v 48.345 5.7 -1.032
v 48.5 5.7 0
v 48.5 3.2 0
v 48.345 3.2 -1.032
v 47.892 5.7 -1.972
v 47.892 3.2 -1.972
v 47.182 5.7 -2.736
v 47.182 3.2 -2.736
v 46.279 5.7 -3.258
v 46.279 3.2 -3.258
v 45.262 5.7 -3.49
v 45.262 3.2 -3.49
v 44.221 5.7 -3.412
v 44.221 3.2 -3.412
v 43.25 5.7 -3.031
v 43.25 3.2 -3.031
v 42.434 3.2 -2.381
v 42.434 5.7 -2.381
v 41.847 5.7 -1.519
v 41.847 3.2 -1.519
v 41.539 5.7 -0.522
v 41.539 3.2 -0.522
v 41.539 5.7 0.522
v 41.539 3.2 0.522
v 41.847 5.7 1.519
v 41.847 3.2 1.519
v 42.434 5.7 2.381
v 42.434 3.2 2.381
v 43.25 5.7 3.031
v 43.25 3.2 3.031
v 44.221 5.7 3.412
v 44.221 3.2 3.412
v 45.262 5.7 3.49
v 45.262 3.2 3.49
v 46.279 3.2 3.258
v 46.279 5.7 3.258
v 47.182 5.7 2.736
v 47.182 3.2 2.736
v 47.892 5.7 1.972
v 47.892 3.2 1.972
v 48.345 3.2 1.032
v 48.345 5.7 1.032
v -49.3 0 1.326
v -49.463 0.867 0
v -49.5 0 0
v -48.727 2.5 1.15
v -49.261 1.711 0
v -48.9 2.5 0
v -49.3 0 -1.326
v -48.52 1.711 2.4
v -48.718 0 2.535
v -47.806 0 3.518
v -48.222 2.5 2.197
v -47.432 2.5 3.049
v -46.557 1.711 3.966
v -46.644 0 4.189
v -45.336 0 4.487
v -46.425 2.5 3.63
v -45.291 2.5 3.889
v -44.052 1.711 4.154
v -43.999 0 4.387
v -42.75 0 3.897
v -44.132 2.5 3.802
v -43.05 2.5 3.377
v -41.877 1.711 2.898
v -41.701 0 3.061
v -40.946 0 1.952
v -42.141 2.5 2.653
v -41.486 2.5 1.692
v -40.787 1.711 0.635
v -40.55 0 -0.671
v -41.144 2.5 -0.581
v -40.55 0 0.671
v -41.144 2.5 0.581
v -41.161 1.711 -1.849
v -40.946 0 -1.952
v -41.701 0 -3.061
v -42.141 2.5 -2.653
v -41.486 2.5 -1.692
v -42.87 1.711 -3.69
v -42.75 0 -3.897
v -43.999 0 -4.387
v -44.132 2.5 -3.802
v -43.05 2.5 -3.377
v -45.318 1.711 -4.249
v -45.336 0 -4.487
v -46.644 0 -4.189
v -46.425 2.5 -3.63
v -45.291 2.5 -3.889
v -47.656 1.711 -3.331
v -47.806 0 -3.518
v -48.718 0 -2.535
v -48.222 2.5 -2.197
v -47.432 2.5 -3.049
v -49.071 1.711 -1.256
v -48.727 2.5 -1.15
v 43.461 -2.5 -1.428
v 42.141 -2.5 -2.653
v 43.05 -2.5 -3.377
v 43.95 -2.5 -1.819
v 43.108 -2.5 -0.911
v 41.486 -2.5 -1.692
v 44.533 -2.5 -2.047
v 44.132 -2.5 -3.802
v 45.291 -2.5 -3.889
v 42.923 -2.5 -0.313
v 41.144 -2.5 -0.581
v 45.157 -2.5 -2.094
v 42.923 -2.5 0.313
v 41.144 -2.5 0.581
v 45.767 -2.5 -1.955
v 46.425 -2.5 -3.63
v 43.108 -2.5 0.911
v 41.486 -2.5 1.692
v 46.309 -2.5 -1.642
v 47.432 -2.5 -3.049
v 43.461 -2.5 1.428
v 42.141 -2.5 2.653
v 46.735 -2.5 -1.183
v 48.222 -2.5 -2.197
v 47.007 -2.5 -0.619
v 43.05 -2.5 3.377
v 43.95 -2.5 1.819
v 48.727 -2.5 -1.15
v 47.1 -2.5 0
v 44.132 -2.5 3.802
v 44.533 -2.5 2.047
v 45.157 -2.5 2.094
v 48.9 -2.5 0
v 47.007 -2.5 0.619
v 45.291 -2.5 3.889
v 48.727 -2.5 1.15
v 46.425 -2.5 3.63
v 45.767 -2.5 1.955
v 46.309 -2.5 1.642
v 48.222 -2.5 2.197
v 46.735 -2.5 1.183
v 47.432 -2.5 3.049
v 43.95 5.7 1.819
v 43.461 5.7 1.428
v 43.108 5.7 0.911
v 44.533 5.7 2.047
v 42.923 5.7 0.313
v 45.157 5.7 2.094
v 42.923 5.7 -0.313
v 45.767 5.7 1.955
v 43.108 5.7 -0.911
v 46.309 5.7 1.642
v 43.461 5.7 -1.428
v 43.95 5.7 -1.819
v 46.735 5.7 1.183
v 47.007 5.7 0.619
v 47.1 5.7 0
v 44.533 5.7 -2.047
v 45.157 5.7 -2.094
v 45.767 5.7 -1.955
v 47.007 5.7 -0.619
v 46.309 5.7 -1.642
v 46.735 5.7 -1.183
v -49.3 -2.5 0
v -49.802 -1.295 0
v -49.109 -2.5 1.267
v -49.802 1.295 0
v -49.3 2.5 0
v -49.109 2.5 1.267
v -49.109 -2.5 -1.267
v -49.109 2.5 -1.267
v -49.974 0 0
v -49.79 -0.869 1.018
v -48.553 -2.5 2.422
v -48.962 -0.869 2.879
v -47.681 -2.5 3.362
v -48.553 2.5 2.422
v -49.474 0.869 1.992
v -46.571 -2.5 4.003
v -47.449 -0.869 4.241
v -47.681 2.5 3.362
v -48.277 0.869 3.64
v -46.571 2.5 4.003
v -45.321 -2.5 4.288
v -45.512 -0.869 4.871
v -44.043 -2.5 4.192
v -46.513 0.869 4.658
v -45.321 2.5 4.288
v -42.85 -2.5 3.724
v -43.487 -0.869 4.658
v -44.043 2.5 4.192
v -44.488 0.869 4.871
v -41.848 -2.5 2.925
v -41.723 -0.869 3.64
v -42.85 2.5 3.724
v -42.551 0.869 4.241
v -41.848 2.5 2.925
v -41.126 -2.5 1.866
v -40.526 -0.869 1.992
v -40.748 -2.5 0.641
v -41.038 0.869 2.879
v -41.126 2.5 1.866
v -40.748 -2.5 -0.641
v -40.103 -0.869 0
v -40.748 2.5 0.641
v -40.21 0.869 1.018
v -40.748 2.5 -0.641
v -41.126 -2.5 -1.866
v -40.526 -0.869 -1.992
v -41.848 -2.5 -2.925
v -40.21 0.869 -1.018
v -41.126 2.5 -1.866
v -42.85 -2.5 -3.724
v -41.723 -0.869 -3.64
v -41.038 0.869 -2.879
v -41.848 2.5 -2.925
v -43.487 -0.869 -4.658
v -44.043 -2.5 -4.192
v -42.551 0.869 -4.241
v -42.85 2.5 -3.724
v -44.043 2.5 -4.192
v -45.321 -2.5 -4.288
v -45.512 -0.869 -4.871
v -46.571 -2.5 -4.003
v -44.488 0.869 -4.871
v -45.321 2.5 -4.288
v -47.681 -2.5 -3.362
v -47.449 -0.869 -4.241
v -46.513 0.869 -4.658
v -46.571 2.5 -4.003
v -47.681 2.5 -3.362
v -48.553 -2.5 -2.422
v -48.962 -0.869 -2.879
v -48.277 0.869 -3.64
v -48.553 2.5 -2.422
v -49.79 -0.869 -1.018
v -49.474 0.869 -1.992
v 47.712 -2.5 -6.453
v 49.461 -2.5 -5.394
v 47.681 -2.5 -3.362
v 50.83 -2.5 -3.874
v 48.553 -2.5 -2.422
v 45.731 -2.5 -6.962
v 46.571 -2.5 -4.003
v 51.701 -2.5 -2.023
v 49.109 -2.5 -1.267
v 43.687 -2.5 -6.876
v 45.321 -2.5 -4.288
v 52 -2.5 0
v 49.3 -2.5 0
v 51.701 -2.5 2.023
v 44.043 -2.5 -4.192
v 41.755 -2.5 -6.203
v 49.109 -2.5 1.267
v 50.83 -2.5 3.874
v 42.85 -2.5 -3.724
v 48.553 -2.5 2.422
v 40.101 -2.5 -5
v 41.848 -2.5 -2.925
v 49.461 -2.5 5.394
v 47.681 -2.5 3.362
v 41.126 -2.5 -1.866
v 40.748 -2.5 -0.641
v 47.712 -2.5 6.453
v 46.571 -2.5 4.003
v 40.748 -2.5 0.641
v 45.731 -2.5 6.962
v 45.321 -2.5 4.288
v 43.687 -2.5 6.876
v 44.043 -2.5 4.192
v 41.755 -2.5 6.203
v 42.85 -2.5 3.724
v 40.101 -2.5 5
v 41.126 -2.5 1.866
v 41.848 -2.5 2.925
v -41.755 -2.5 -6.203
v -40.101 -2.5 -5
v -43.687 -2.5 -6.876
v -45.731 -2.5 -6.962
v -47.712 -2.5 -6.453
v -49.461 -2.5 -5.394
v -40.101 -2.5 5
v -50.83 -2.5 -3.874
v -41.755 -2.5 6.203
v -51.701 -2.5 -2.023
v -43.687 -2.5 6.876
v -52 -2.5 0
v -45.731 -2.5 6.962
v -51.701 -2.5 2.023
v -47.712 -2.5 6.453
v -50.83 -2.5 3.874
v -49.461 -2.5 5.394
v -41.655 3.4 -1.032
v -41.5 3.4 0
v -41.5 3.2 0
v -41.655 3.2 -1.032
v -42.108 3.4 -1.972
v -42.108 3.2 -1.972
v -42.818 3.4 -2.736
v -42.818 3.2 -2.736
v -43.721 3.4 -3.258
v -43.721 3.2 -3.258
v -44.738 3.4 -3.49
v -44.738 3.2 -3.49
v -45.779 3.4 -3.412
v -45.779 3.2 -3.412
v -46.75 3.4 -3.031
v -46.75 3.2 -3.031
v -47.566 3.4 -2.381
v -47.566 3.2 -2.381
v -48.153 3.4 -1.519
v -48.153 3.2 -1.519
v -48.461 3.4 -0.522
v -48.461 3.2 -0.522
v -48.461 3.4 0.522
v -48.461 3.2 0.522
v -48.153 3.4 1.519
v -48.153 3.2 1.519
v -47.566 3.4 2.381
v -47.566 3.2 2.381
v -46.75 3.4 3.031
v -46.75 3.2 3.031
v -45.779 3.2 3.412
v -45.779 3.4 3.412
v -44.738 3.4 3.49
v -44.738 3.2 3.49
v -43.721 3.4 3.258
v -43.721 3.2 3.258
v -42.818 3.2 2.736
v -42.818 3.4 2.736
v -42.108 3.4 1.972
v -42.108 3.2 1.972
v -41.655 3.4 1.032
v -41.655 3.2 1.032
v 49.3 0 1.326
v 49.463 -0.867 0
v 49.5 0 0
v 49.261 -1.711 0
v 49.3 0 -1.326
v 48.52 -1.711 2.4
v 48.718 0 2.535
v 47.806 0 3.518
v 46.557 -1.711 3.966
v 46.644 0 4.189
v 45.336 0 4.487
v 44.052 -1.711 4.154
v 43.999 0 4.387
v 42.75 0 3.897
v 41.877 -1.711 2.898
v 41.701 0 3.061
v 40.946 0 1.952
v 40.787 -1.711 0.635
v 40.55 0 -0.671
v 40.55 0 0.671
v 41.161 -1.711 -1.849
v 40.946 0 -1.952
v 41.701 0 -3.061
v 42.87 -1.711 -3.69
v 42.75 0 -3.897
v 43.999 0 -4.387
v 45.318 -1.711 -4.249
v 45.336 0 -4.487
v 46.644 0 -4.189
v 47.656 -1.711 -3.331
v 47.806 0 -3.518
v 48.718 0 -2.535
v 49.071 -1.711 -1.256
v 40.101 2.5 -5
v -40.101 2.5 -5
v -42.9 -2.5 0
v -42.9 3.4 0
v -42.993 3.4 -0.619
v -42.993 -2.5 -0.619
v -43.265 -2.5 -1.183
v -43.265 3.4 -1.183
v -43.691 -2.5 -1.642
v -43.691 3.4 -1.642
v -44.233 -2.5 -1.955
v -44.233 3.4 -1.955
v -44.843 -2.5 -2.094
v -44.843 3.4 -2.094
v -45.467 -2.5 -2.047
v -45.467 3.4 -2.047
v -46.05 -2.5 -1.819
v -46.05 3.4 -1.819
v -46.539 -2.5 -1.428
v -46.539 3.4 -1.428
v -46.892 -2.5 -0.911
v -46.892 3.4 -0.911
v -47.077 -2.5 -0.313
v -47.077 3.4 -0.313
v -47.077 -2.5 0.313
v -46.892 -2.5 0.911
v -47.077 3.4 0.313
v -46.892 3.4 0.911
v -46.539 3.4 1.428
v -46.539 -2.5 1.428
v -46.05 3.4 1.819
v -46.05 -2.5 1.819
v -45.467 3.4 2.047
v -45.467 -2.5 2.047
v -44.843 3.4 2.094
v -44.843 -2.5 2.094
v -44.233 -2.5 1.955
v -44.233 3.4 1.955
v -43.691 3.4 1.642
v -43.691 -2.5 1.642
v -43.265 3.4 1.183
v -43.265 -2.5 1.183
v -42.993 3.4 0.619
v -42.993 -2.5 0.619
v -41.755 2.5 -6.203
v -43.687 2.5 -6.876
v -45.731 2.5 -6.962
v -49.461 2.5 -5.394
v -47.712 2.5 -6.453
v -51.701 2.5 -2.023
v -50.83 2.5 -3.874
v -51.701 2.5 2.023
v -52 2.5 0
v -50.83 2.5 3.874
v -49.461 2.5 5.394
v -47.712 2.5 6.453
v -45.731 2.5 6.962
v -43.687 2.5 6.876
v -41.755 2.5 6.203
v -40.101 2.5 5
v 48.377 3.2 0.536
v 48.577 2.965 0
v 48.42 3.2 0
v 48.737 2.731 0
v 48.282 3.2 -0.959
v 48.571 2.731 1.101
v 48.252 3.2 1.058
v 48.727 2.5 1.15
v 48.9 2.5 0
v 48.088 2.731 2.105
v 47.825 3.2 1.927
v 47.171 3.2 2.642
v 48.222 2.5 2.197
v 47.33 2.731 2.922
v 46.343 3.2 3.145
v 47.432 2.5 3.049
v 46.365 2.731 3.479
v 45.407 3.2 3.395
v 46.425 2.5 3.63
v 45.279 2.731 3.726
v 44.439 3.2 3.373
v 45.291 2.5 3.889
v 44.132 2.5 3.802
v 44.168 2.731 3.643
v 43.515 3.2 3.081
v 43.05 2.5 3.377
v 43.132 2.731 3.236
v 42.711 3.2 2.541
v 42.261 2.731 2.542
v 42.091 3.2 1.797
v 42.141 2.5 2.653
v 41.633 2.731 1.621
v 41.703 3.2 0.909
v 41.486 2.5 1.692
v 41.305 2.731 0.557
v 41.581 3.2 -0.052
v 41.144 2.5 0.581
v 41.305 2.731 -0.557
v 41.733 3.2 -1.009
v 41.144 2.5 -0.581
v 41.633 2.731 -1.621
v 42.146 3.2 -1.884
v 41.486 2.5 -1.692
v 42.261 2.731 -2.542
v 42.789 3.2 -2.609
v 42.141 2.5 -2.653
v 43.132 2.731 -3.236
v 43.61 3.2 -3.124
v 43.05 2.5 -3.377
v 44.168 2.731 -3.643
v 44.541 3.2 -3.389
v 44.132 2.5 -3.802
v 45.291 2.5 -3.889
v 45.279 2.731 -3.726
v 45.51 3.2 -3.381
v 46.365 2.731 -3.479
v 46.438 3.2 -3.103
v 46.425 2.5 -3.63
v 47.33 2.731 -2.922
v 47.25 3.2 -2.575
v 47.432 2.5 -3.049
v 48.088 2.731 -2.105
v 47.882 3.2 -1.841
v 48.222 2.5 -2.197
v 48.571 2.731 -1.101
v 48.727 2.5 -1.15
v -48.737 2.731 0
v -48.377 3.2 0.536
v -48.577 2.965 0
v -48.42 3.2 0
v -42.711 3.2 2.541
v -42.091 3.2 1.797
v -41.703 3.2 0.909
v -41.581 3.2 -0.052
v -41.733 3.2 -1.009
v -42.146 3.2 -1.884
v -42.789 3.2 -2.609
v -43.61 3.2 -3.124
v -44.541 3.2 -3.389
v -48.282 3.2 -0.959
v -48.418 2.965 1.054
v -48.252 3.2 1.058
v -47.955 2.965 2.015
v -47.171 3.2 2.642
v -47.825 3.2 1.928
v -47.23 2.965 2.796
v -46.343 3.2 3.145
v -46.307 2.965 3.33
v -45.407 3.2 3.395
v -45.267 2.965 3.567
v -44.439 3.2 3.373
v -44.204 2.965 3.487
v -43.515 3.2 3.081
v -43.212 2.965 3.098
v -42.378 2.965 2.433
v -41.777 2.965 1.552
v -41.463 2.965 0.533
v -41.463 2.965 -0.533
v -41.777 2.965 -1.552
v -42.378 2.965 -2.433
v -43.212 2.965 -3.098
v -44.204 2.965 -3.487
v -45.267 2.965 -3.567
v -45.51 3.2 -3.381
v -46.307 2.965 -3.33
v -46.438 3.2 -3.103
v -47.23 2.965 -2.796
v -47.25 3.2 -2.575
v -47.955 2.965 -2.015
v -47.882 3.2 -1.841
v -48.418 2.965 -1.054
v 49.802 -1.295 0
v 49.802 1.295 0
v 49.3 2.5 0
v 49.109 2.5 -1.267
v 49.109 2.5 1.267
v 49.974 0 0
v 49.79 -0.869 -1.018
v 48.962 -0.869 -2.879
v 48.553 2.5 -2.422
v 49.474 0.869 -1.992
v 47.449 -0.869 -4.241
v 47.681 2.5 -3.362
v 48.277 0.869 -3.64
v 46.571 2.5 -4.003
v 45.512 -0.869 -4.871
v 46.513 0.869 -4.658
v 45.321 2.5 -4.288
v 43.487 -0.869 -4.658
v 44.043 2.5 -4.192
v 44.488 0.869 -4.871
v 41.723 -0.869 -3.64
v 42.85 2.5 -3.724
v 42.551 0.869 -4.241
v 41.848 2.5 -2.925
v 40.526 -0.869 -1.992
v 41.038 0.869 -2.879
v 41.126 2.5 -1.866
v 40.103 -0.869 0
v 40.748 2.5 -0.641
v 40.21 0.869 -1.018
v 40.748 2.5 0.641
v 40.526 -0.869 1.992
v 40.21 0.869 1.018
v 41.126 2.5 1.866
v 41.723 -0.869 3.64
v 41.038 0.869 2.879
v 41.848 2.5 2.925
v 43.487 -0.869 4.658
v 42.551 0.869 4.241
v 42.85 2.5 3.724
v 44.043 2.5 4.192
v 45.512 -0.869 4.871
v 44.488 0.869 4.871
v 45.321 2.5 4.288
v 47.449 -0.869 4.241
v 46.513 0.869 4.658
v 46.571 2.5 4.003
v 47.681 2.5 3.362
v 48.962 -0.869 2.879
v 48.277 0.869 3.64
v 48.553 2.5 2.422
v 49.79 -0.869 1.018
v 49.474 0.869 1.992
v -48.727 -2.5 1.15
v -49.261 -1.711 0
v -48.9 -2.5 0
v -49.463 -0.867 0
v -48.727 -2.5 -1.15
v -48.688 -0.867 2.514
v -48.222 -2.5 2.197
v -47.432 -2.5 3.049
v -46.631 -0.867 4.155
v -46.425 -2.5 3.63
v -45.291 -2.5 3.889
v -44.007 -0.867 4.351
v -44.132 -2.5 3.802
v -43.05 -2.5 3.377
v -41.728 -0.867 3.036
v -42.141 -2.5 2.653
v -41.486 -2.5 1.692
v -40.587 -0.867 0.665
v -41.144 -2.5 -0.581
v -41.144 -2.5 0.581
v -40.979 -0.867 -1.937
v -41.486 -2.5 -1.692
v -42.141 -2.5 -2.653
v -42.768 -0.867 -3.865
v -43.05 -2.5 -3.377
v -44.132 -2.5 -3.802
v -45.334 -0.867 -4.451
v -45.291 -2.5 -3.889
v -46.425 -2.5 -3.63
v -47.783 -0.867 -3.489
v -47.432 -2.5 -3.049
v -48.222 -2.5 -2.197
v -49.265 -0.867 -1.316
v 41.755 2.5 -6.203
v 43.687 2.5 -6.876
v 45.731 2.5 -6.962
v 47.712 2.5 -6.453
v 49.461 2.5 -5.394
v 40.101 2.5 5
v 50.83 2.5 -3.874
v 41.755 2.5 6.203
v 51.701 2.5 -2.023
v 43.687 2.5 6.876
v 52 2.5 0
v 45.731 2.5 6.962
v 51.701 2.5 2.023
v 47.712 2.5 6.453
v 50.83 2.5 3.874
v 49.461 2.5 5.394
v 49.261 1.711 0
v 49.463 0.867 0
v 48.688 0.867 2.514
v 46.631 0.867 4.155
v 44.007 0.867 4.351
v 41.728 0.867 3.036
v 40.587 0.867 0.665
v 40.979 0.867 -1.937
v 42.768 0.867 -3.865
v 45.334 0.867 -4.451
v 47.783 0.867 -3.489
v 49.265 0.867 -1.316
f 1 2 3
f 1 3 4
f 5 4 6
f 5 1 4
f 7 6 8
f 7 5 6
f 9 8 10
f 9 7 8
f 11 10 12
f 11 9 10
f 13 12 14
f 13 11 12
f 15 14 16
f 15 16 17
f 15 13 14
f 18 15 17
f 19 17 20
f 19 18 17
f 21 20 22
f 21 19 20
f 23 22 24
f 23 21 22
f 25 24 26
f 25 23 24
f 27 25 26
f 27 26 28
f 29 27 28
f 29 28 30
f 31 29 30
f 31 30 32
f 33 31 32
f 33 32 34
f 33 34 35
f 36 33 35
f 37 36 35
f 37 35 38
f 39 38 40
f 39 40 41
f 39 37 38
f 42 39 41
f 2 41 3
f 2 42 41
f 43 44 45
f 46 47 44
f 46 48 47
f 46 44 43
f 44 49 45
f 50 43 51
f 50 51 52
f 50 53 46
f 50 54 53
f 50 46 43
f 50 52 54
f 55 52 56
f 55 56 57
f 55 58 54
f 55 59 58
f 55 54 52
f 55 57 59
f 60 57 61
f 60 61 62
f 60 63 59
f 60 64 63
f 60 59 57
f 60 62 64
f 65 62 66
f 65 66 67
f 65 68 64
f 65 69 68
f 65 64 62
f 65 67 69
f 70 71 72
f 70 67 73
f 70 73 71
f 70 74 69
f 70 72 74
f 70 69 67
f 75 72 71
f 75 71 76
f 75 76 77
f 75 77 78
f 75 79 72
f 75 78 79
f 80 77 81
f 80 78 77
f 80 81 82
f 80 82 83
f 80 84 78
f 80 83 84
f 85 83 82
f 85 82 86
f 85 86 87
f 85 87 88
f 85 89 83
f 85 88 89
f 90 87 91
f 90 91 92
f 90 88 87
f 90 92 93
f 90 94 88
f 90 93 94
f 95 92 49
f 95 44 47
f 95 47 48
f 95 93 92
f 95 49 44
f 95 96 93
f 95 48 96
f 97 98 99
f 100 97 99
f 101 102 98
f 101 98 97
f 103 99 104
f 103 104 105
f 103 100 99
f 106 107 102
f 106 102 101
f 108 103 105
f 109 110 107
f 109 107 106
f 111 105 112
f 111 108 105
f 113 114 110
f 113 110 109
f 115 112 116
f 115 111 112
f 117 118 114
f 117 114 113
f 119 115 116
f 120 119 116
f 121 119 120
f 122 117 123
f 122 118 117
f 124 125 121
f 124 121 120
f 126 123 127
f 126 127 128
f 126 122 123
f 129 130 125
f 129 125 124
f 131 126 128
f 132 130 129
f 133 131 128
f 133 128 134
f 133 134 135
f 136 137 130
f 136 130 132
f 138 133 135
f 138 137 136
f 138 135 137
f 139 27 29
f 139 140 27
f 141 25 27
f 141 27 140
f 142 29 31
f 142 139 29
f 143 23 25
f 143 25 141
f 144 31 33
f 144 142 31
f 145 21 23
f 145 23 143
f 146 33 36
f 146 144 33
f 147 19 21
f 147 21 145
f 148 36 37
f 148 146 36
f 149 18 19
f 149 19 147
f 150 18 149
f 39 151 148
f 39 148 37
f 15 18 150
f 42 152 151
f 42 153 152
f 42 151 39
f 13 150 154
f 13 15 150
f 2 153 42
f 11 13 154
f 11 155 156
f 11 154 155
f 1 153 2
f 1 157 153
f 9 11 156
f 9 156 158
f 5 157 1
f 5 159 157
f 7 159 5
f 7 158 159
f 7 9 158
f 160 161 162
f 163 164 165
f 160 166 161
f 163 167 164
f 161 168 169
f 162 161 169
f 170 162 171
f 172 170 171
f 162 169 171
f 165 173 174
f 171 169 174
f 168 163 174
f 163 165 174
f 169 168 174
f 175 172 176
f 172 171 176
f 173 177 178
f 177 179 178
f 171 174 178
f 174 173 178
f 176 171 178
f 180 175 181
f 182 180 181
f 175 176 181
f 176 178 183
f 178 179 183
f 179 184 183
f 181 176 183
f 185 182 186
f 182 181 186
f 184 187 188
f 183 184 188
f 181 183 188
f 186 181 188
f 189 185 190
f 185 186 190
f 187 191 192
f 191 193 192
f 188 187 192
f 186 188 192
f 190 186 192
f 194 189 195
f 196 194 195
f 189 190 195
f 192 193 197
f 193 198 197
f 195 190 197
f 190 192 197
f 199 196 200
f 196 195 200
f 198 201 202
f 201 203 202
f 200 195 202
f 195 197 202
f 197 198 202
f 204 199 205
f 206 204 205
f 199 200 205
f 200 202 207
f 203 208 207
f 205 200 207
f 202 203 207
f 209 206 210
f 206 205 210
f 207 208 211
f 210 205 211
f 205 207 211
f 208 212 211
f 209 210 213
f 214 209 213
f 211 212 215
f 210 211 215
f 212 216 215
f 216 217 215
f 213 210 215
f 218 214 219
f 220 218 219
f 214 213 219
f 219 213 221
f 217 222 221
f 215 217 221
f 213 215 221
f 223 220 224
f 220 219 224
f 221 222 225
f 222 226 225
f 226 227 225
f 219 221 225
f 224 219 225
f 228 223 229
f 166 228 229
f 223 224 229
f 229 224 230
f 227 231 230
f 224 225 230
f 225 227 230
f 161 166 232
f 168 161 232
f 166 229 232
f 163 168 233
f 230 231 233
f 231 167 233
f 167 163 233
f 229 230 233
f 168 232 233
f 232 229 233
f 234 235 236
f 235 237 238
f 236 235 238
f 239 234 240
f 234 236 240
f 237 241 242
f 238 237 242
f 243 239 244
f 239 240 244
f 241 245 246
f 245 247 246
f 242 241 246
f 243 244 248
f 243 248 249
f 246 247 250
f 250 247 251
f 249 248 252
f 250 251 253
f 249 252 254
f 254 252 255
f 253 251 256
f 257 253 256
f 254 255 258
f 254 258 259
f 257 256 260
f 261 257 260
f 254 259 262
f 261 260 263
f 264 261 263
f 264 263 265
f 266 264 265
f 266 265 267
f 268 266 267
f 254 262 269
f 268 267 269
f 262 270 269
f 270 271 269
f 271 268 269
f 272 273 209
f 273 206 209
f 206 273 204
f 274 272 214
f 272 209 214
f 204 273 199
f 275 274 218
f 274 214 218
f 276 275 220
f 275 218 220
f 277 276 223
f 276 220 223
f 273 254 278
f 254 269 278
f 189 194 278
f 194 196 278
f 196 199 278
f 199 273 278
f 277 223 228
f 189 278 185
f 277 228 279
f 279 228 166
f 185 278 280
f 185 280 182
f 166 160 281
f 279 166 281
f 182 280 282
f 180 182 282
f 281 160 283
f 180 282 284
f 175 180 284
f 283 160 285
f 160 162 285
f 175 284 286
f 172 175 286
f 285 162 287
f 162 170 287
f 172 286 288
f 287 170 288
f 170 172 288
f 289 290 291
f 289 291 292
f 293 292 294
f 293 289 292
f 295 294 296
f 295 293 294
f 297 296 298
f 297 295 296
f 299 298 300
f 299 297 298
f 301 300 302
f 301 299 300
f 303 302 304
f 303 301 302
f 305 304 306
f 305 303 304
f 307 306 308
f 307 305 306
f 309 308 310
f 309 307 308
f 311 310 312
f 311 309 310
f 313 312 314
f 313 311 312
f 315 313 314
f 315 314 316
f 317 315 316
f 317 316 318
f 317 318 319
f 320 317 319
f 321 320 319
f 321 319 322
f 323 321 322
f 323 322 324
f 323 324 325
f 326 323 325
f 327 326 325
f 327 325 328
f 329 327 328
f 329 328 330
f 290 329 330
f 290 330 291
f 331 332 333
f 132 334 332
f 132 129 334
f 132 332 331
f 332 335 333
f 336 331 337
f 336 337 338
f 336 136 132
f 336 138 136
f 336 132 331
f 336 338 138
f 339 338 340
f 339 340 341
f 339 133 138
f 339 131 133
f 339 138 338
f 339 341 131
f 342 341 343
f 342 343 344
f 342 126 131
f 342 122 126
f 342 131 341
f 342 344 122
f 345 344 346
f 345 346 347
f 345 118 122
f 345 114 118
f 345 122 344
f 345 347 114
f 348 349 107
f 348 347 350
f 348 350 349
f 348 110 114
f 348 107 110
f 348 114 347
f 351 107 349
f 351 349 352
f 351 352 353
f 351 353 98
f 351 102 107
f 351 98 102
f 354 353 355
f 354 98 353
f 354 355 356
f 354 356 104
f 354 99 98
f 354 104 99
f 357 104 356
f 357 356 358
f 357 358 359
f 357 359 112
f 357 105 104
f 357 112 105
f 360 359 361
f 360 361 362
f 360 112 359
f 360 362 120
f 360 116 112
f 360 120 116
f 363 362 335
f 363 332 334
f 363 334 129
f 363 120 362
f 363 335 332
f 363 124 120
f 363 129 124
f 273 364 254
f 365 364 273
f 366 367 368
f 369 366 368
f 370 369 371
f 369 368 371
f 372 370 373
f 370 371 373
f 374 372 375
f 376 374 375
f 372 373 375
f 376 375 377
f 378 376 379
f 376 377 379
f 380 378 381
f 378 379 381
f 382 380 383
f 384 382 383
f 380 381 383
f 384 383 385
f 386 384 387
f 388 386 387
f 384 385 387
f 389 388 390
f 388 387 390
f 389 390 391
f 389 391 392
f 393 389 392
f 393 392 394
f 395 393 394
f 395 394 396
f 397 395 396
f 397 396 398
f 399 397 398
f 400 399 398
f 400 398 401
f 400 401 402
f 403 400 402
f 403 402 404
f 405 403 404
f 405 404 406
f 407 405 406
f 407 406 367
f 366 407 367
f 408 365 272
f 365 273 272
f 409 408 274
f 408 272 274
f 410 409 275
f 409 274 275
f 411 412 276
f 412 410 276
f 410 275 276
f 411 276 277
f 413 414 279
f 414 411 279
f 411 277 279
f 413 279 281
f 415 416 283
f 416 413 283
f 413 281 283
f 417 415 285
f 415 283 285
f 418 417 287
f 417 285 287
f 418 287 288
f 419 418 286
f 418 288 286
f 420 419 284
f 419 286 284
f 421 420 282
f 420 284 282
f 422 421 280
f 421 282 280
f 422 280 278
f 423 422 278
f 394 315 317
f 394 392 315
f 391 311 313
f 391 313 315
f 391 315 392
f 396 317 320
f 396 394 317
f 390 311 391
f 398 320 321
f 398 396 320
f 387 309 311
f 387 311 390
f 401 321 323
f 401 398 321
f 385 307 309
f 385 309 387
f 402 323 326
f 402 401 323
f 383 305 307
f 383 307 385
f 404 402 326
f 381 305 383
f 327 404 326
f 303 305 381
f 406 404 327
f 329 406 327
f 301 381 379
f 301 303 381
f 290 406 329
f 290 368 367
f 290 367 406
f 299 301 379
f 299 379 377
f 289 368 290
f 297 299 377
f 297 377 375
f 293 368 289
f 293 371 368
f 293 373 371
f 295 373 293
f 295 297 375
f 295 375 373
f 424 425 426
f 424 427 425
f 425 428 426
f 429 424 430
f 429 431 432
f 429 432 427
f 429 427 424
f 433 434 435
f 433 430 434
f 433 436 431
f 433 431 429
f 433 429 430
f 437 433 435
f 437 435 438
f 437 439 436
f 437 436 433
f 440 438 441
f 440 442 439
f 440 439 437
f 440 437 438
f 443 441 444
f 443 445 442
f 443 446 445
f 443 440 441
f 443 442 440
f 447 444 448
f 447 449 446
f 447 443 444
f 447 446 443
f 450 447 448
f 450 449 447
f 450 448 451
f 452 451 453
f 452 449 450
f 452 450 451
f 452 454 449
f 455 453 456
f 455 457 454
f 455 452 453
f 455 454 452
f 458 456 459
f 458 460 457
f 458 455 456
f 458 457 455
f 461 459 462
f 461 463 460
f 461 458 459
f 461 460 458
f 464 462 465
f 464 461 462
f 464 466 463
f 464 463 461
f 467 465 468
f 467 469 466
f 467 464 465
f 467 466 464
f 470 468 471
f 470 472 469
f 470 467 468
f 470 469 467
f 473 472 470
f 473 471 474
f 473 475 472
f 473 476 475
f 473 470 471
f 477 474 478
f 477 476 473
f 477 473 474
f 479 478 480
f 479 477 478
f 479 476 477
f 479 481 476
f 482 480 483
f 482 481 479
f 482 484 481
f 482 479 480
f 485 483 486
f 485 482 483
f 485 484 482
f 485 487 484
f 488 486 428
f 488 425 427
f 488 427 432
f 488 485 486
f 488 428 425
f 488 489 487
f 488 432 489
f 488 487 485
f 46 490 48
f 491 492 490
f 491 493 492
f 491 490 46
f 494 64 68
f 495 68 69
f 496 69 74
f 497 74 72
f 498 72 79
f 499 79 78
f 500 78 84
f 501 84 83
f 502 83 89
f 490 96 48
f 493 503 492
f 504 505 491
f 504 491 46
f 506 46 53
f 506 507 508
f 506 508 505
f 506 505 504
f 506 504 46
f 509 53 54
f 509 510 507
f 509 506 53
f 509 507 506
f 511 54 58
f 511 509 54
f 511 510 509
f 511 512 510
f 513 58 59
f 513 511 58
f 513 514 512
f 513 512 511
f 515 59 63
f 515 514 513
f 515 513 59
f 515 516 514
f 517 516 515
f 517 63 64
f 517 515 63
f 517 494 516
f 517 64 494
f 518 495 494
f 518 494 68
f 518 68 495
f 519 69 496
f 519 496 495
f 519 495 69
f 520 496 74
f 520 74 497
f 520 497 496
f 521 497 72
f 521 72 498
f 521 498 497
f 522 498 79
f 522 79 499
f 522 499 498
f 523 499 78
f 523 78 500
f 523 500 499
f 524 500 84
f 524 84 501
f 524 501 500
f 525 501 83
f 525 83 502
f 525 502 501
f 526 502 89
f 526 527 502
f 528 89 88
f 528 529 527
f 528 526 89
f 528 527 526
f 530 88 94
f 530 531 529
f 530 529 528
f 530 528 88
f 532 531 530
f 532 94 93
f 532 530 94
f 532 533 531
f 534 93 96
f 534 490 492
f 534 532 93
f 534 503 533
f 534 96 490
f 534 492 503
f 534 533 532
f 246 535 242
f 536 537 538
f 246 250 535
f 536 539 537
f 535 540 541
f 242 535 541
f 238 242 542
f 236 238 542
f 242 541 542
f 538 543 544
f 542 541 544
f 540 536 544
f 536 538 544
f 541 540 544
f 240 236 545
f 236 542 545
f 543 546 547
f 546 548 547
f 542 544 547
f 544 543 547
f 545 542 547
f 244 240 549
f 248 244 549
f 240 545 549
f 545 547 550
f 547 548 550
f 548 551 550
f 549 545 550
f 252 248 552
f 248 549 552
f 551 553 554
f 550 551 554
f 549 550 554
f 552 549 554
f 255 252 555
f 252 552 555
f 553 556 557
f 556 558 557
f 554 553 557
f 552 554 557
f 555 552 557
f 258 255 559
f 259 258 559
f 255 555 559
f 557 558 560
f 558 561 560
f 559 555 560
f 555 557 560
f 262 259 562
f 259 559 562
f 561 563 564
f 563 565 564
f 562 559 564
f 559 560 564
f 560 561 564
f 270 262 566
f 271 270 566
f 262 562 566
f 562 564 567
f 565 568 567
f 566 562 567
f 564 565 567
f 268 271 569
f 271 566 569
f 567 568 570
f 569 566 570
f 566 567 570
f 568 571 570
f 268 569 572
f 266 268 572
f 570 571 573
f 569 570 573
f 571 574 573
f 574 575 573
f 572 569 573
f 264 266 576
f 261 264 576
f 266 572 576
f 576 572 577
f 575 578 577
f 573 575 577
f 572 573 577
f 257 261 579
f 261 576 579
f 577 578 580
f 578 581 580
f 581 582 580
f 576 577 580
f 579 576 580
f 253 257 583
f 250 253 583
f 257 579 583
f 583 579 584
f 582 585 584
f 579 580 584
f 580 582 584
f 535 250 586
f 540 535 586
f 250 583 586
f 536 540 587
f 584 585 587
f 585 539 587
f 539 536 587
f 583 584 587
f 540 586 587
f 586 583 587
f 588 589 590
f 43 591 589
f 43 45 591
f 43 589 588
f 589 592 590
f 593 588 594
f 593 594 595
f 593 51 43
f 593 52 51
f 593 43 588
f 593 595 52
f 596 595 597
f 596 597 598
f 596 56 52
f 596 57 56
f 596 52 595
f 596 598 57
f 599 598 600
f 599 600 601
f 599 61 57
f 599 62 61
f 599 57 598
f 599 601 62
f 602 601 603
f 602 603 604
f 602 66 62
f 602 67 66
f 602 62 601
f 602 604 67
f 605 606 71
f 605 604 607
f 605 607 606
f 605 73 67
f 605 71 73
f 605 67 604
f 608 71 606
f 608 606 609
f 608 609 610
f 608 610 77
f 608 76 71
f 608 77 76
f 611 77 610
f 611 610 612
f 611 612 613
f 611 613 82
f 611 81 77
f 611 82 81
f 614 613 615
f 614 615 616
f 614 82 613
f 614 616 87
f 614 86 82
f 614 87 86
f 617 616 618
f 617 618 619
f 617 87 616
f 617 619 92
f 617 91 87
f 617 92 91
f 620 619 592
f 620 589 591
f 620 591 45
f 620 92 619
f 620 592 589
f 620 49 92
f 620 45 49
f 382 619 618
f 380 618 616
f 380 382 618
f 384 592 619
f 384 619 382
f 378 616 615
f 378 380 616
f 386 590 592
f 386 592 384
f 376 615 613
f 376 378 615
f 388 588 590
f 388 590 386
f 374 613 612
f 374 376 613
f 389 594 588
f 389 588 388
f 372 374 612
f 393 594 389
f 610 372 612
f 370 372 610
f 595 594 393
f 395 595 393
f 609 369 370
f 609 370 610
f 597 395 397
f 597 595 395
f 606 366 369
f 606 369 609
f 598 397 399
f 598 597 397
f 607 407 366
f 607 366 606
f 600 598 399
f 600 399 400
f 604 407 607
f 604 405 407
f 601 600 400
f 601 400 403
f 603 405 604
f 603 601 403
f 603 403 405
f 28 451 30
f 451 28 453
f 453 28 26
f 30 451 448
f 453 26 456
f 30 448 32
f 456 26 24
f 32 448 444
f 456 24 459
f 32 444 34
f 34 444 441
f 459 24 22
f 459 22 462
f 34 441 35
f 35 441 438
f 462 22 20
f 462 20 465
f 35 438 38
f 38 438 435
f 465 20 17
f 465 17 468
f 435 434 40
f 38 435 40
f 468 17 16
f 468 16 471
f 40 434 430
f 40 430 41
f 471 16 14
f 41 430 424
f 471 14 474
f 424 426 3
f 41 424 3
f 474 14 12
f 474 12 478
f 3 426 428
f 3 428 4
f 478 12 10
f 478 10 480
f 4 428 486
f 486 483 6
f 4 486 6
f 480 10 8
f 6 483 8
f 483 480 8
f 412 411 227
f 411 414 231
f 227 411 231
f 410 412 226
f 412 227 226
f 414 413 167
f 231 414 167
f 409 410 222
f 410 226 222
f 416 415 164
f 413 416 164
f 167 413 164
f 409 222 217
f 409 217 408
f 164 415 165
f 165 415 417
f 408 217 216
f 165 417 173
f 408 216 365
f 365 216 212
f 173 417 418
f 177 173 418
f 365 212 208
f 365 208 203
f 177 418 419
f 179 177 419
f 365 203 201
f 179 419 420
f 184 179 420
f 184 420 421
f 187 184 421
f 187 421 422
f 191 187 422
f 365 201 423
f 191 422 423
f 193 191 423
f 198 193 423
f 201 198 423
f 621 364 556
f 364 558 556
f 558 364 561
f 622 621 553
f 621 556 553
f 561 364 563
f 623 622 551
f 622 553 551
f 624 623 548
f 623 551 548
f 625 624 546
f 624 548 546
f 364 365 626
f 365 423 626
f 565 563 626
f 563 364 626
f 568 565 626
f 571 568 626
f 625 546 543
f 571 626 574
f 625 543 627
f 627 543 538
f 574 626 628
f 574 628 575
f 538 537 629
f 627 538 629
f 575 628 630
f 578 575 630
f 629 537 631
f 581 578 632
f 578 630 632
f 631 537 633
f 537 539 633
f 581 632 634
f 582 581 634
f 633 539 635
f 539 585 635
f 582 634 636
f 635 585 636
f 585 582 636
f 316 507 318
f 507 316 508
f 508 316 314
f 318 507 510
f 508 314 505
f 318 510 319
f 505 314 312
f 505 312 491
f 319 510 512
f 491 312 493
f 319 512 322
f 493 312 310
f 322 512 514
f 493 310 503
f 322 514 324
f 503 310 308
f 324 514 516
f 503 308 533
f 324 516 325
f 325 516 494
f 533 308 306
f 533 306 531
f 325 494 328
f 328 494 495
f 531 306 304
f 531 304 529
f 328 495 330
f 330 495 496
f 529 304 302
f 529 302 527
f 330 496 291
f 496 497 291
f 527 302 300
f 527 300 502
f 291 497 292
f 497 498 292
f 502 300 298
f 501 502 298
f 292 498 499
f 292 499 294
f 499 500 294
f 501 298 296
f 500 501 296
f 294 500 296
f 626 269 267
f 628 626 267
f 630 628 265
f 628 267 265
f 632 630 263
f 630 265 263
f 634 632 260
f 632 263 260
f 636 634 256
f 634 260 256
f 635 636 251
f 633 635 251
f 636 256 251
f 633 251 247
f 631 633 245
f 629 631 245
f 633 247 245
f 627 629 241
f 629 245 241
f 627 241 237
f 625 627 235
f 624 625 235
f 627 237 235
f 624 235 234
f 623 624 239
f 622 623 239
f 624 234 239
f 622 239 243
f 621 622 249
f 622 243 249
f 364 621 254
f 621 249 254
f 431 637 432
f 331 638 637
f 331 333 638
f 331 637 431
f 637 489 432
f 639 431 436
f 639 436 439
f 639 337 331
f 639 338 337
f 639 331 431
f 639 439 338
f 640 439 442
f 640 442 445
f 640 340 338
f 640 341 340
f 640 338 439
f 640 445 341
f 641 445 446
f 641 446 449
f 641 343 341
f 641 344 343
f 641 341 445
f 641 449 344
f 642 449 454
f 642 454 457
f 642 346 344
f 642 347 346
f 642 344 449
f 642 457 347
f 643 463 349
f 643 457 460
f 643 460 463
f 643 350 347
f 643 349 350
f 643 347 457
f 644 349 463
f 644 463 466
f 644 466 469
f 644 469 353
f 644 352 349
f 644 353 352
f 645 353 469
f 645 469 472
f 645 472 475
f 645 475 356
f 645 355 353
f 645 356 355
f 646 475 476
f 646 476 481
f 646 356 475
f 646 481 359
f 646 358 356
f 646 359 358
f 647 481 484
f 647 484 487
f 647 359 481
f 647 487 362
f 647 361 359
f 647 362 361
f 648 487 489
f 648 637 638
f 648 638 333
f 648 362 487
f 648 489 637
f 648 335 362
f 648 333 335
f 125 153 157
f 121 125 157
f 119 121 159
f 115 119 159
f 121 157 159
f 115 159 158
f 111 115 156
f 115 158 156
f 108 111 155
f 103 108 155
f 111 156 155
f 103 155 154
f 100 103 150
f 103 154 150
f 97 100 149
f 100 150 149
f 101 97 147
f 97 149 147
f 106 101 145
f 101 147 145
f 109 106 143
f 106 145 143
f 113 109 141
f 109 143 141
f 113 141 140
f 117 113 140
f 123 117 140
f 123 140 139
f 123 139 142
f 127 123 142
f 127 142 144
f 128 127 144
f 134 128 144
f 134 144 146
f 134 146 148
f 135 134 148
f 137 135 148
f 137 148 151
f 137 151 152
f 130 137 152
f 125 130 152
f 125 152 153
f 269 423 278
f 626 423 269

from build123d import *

# Parameters (mm, degrees)
BOSS_EXTRUDE1_DEPTH = 5
SKETCH7_R           = 2.1
CUT_EXTRUDE1_DEPTH  = 11
SKETCH8_R           = 3.5
SKETCH8_R_2         = 2.1
BOSS_EXTRUDE2_DEPTH = 2.5
SKETCH9_R           = 5.053778945
CUT_EXTRUDE2_DEPTH  = 2
SKETCH10_R          = 7.844630339
CUT_EXTRUDE3_DEPTH  = 0.3


with BuildPart() as part:
    # Sketch1 → Revolve1 (revolve)
    with BuildSketch(Plane.XY):
        with BuildLine():
            Line((-52, 2.5), (-52, -2.5))
            Line((-52, -2.5), (-49.3, -2.5))
            ThreePointArc((-49.3, -2.5), (-49.973932046, 0), (-49.3, 2.5))
            Line((-49.3, 2.5), (-52, 2.5))
        make_face()
    revolve(axis=Axis((-45, -2.5, 0), (0, 1, 0)))



with BuildPart() as body_2:
    # Sketch2 → Revolve2 (revolve)
    with BuildSketch(Plane.XY):
        with BuildLine():
            Line((52, 2.5), (52, -2.5))
            Line((52, -2.5), (49.3, -2.5))
            ThreePointArc((49.3, -2.5), (49.973932046, 0), (49.3, 2.5))
            Line((49.3, 2.5), (52, 2.5))
        make_face()
    revolve(axis=Axis((45, -2.5, 0), (0, 1, 0)))


with BuildPart() as part_1:
    add(part.part)

    add(body_2.part)  # Boss-Extrude1 merges body 2
    # Sketch4 → Boss-Extrude1 (add)
    with BuildSketch(Plane(origin=(0, 2.5, 0), x_dir=(1, 0, 0), z_dir=(0, 1, 0))):
        with BuildLine():
            Line((-40.101020514, 5), (-40.101020514, 3.464101615))
            ThreePointArc((-40.101020514, 3.464101615), (-39, 0), (-40.101020514, -3.464101615))
            Line((-40.101020514, -3.464101615), (-40.101020514, -5))
            Line((-40.101020514, -5), (40.101020514, -5))
            Line((40.101020514, -5), (40.101020514, -3.464101615))
            ThreePointArc((40.101020514, -3.464101615), (39, 0), (40.101020514, 3.464101615))
            Line((40.101020514, 3.464101615), (40.101020514, 5))
            Line((40.101020514, 5), (-40.101020514, 5))
        make_face()
    extrude(amount=-BOSS_EXTRUDE1_DEPTH)


with BuildPart() as body_2_2:
    # Sketch5 → Revolve3 (revolve)
    with BuildSketch(Plane.XY):
        with BuildLine():
            ThreePointArc((-48.9, 2.5), (-48.490203099, 3.093468733), (-48.1, 3.7))
            Line((-48.1, 3.7), (-48.1, 5.7))
            Line((-48.1, 5.7), (-45, 5.7))
            Line((-45, 5.7), (-45, 3.7))
            Line((-45, 3.7), (-45, -2.5))
            Line((-45, -2.5), (-48.9, -2.5))
            ThreePointArc((-48.9, -2.5), (-49.382326119, -1.293758269), (-49.5, 0))
            ThreePointArc((-49.5, 0), (-49.382326119, 1.293758269), (-48.9, 2.5))
        make_face()
    revolve(axis=Axis((-45, -2.5, 0), (0, 1, 0)))


with BuildPart() as body_3:
    # Sketch6 → Revolve4 (revolve)
    with BuildSketch(Plane.XY):
        with BuildLine():
            ThreePointArc((48.1, 3.7), (48.490203099, 3.093468733), (48.9, 2.5))
            ThreePointArc((48.9, 2.5), (49.382326119, 1.293758269), (49.5, 0))
            ThreePointArc((49.5, 0), (49.382326119, -1.293758269), (48.9, -2.5))
            Line((48.9, -2.5), (45, -2.5))
            Line((45, -2.5), (45, 5.7))
            Line((45, 5.7), (48.1, 5.7))
            Line((48.1, 5.7), (48.1, 3.7))
        make_face()
    revolve(axis=Axis((45, 5.7, 0), (0, -1, 0)))


with BuildPart() as cut_extrude1_tool:
    # Sketch7 → Cut-Extrude1 (new body)
    with BuildSketch(Plane(origin=(0, 5.7, 0), x_dir=(1, 0, 0), z_dir=(0, 1, 0))):
        with Locations((-45, 0)):
            Circle(SKETCH7_R)
        with Locations((45, 0)):
            Circle(SKETCH7_R)
    extrude(amount=-CUT_EXTRUDE1_DEPTH)


with BuildPart() as body_2_2_1:
    add(body_2_2.part)

    # Cut-Extrude1: cut by cut_extrude1_tool
    add(cut_extrude1_tool.part, mode=Mode.SUBTRACT)



with BuildPart() as body_3_1:
    add(body_3.part)

    # Cut-Extrude1: cut by cut_extrude1_tool
    add(cut_extrude1_tool.part, mode=Mode.SUBTRACT)


with BuildPart() as body_2_2_2:
    add(body_2_2_1.part)

    add(body_3_1.part)  # Boss-Extrude2 merges body 3
    # Sketch8 → Boss-Extrude2 (add)
    with BuildSketch(Plane(origin=(0, 5.7, 0), x_dir=(1, 0, 0), z_dir=(0, 1, 0))):
        with Locations((-45, 0)):
            Circle(SKETCH8_R)
        with Locations((-45, 0)):
            Circle(SKETCH8_R_2, mode=Mode.SUBTRACT)
        with Locations((45, 0)):
            Circle(SKETCH8_R)
        with Locations((45, 0)):
            Circle(SKETCH8_R_2, mode=Mode.SUBTRACT)
    extrude(amount=-BOSS_EXTRUDE2_DEPTH)

    # Sketch9 → Cut-Extrude2 (cut)
    with BuildSketch(Plane(origin=(0, 5.7, 0), x_dir=(1, 0, 0), z_dir=(0, 1, 0))):
        with Locations((-45, 0)):
            Circle(SKETCH9_R)
    extrude(amount=-CUT_EXTRUDE2_DEPTH, mode=Mode.SUBTRACT)

    # Sketch10 → Cut-Extrude3 (cut)
    with BuildSketch(Plane(origin=(0, 3.7, 0), x_dir=(1, 0, 0), z_dir=(0, 1, 0))):
        with Locations((-45, 0)):
            Circle(SKETCH10_R)
    extrude(amount=-CUT_EXTRUDE3_DEPTH, mode=Mode.SUBTRACT)


solid = Compound([part_1.part, body_2_2_2.part])
